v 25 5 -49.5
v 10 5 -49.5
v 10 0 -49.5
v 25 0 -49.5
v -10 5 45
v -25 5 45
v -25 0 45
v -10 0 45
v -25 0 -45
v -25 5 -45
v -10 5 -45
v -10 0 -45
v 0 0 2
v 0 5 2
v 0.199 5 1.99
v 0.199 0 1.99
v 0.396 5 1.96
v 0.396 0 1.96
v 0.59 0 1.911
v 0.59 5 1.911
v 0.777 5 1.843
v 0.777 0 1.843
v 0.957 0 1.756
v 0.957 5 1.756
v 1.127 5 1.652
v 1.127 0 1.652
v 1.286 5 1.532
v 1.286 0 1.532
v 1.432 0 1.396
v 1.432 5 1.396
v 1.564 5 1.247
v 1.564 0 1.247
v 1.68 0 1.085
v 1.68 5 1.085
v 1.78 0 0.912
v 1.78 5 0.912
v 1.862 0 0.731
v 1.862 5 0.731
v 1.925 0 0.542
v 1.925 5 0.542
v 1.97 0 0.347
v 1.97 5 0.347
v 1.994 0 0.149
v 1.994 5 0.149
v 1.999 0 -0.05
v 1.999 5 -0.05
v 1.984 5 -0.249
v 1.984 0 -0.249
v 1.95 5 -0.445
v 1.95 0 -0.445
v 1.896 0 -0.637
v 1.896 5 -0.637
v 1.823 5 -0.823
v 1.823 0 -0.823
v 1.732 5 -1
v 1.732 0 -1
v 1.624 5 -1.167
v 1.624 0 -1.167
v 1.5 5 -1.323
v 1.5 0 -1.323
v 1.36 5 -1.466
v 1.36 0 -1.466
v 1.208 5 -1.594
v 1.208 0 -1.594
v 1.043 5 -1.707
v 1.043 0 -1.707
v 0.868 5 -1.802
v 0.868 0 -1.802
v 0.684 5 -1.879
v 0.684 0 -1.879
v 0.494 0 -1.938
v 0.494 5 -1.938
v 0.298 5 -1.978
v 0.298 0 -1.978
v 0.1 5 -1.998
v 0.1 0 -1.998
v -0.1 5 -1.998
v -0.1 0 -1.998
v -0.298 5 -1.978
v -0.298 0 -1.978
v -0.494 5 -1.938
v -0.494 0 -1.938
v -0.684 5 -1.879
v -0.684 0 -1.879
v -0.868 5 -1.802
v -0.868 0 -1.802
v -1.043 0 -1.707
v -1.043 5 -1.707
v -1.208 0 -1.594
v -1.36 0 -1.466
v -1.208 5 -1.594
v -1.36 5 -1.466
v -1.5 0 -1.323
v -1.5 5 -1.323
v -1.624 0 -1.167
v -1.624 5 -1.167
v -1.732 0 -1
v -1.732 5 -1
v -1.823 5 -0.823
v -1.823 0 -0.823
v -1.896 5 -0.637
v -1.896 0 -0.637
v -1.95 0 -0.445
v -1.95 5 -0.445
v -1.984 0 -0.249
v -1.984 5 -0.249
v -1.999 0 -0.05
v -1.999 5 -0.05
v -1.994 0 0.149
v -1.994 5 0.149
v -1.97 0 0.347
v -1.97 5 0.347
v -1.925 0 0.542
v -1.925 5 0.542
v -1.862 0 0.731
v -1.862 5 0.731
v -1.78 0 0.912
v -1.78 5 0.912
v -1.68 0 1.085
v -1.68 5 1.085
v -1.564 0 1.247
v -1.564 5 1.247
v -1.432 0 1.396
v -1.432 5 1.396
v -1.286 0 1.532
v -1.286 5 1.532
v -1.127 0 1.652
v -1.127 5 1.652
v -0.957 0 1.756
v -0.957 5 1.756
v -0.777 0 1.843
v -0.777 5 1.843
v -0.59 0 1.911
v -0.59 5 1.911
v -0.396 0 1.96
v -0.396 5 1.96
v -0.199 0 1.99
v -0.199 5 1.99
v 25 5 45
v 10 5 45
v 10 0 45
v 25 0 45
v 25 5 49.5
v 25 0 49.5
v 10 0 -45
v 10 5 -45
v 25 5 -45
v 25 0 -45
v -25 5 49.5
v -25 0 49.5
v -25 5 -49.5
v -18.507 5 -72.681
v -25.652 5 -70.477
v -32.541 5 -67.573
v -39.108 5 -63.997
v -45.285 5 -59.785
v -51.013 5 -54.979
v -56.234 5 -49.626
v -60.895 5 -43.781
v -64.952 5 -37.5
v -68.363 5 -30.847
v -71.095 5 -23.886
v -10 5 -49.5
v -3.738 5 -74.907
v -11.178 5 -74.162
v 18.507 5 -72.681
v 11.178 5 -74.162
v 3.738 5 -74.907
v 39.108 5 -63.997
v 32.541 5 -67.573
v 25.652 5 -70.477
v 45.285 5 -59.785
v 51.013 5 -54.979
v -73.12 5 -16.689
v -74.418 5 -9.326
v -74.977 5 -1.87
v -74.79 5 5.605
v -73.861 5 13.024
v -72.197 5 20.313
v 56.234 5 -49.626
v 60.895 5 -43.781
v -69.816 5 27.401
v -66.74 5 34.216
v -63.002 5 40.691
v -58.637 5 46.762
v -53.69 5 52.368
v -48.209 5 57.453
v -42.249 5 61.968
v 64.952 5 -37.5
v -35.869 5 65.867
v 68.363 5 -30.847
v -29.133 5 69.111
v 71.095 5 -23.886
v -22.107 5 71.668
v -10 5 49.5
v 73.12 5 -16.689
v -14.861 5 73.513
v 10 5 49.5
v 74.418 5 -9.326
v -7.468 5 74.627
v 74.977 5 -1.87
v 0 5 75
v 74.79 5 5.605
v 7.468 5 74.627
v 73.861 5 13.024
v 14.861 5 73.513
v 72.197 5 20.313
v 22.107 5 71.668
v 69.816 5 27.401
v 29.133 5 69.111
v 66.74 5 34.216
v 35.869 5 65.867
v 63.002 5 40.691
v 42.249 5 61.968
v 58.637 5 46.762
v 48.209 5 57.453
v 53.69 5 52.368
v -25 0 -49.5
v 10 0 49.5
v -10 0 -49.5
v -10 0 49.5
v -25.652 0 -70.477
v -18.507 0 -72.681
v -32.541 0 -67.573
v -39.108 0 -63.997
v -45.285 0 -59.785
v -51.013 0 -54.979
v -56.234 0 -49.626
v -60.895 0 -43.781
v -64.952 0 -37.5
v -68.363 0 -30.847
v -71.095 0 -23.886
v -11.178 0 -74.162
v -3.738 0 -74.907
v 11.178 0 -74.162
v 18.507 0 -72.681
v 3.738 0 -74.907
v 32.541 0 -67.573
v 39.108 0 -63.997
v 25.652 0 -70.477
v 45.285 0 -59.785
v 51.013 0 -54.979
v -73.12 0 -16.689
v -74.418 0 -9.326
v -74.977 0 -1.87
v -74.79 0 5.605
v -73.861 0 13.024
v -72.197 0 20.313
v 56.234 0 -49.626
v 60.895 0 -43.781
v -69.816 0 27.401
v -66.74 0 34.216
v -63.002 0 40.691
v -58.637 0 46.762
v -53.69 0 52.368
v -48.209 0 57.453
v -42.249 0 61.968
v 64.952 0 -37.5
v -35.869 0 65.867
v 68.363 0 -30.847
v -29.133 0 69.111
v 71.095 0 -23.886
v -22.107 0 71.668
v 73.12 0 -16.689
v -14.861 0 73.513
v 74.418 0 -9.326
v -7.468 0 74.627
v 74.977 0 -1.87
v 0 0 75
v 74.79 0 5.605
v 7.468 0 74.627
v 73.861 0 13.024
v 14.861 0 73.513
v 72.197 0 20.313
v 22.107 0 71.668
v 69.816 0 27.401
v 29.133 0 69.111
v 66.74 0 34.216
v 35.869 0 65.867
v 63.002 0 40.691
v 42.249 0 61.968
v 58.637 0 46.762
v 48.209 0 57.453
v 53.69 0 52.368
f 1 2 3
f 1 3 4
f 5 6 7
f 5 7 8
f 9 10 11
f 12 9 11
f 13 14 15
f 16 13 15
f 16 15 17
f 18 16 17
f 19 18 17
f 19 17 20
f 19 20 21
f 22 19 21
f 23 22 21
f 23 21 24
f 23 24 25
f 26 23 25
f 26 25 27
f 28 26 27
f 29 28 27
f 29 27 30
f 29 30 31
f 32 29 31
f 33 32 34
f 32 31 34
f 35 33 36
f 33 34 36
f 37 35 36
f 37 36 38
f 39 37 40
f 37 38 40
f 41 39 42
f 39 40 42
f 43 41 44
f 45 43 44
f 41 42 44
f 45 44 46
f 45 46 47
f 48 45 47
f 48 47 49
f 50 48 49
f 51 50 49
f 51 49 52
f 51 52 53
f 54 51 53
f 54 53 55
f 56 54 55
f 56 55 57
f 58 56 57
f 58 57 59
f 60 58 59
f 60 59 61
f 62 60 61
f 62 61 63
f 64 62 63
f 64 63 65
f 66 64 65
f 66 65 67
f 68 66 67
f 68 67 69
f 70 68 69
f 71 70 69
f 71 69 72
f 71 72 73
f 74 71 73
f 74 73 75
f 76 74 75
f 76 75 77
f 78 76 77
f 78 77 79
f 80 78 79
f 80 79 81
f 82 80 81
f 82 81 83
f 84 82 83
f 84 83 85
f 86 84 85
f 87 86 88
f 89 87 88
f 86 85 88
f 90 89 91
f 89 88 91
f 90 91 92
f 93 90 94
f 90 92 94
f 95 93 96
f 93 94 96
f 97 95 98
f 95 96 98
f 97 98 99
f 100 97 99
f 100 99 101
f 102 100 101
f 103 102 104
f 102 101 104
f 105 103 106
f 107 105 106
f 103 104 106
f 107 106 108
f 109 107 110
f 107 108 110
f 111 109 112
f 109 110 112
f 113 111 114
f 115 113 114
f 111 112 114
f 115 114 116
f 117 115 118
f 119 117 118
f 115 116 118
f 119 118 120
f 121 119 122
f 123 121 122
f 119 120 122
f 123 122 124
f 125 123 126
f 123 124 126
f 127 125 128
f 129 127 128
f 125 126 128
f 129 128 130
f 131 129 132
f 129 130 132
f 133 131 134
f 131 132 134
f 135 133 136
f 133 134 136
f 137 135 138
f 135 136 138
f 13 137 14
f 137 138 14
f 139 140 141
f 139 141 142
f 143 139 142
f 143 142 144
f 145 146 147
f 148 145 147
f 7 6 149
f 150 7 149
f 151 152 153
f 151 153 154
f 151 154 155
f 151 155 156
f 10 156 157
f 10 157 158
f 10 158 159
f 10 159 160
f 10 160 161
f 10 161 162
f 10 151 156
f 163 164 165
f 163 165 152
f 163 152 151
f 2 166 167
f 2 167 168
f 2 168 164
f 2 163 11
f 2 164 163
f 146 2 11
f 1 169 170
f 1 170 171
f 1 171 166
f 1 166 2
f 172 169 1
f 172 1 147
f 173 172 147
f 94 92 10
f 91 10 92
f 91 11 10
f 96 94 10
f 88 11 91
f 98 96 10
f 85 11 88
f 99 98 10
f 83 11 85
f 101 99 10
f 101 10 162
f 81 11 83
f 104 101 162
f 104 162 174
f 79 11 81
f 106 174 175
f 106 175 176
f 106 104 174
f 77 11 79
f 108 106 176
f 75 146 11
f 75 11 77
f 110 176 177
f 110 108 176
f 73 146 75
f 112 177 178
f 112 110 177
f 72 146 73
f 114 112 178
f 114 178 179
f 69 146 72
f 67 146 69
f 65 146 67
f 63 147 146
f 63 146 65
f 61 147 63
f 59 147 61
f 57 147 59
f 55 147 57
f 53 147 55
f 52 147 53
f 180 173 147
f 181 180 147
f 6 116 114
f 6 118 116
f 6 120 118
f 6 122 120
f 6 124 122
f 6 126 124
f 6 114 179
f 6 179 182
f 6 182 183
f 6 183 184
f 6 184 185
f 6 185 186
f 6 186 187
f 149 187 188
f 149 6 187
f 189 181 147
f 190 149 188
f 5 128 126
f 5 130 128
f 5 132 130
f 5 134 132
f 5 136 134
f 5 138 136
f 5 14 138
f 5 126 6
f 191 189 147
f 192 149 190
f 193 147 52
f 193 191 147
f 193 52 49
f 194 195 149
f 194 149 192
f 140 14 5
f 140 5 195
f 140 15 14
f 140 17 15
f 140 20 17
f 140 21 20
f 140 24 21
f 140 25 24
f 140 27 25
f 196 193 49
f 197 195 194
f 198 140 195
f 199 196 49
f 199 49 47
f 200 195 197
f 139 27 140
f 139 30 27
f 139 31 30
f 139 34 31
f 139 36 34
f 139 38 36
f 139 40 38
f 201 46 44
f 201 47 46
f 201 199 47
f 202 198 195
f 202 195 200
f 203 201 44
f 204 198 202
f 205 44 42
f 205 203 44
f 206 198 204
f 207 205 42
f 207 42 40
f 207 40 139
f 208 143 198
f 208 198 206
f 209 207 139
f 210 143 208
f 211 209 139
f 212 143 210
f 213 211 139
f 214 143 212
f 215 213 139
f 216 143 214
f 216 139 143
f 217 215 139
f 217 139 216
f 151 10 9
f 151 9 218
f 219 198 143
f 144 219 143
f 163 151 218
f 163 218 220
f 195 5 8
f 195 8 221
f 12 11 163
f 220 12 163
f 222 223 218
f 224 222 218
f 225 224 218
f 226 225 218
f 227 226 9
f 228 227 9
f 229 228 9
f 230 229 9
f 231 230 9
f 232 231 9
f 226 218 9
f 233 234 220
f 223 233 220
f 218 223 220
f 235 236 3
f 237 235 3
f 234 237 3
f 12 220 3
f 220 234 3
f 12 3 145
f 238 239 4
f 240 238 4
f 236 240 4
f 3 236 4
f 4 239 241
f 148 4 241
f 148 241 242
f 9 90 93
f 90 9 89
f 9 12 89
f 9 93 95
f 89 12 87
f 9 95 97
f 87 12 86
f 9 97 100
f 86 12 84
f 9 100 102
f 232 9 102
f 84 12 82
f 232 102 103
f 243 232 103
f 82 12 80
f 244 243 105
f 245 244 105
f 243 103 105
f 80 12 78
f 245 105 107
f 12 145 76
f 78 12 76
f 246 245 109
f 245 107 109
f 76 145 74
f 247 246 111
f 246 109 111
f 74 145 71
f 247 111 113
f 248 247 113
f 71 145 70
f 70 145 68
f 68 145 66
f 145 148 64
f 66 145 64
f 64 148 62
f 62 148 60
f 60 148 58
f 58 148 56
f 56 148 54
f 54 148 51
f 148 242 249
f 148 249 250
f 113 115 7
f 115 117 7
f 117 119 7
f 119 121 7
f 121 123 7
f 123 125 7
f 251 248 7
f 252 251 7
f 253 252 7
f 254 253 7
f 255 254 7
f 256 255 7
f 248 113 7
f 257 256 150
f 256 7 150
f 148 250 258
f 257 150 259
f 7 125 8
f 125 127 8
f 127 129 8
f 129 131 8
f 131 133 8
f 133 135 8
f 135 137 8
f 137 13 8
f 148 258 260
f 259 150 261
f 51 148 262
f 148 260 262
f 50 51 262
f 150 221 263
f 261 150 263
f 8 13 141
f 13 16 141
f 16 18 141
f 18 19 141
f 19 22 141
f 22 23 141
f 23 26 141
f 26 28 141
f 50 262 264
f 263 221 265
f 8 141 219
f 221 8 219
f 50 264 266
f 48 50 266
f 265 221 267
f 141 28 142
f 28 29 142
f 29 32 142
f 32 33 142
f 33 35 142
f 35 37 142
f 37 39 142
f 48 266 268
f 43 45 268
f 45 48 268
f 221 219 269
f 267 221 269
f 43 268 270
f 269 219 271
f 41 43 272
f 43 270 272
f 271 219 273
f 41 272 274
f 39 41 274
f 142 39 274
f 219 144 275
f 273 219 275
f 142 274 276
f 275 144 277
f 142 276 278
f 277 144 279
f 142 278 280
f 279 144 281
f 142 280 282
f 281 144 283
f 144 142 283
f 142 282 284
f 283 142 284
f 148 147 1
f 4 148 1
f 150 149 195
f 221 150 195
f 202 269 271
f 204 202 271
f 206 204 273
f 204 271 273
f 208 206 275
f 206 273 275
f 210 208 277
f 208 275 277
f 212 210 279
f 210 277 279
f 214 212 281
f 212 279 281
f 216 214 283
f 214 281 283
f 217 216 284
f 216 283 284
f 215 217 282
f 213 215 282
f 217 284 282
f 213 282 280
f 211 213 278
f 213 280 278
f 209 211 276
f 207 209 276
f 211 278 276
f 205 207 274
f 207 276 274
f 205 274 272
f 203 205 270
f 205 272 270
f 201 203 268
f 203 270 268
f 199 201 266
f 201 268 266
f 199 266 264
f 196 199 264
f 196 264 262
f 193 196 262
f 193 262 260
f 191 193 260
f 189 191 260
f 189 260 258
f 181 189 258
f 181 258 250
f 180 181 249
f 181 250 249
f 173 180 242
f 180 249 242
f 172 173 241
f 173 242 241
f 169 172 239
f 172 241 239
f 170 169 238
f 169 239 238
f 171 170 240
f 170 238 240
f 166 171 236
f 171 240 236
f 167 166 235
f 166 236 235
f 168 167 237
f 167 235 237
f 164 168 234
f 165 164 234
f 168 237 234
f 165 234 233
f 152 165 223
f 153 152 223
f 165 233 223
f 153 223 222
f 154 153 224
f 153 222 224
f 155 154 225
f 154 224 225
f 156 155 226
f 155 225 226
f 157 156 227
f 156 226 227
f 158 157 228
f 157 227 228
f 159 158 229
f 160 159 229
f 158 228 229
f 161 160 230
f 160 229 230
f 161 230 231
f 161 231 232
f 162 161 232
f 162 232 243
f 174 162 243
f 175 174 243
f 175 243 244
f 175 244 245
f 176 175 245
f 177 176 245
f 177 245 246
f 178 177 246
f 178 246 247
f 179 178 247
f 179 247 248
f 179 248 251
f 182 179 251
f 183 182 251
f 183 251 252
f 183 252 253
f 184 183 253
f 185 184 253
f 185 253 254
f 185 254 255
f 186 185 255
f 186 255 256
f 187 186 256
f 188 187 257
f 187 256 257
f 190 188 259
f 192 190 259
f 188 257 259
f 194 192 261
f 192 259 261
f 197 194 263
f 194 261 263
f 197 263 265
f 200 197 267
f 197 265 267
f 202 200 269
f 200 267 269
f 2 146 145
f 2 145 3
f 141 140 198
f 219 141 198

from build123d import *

# Parameters (mm, degrees)
SKETCH1_R           = 75
BOSS_EXTRUDE1_DEPTH = 5
SKETCH2_W           = 15
SKETCH2_H           = 4.5
CUT_EXTRUDE1_DEPTH  = 10
SKETCH3_R           = 2
CUT_EXTRUDE2_DEPTH  = 10


with BuildPart() as part:
    # Sketch1 → Boss-Extrude1 (new body)
    with BuildSketch(Plane(origin=(0, 0, 0), x_dir=(1, 0, 0), z_dir=(0, 1, 0))):
        with Locations(Location((0, 0, 0), (0, 0, 270))):
            Circle(SKETCH1_R)
    extrude(amount=BOSS_EXTRUDE1_DEPTH)

    # Sketch2 → Cut-Extrude1 (cut)
    with BuildSketch(Plane(origin=(0, 5, 0), x_dir=(1, 0, 0), z_dir=(0, 1, 0))):
        with Locations((-17.5, 47.25)):
            Rectangle(SKETCH2_W, SKETCH2_H)
        with Locations((17.5, 47.25)):
            Rectangle(SKETCH2_W, SKETCH2_H)
    cut_extrude1 = extrude(amount=-CUT_EXTRUDE1_DEPTH, mode=Mode.SUBTRACT)

    # Mirror1: Cut-Extrude1 across plane
    add(cut_extrude1.mirror(Plane.XY), mode=Mode.SUBTRACT)

    # Sketch3 → Cut-Extrude2 (cut)
    with BuildSketch(Plane(origin=(0, 5, 0), x_dir=(1, 0, 0), z_dir=(0, 1, 0))):
        with Locations(Location((0, 0, 0), (0, 0, 270))):
            Circle(SKETCH3_R)
    extrude(amount=-CUT_EXTRUDE2_DEPTH, mode=Mode.SUBTRACT)


solid = part.part
